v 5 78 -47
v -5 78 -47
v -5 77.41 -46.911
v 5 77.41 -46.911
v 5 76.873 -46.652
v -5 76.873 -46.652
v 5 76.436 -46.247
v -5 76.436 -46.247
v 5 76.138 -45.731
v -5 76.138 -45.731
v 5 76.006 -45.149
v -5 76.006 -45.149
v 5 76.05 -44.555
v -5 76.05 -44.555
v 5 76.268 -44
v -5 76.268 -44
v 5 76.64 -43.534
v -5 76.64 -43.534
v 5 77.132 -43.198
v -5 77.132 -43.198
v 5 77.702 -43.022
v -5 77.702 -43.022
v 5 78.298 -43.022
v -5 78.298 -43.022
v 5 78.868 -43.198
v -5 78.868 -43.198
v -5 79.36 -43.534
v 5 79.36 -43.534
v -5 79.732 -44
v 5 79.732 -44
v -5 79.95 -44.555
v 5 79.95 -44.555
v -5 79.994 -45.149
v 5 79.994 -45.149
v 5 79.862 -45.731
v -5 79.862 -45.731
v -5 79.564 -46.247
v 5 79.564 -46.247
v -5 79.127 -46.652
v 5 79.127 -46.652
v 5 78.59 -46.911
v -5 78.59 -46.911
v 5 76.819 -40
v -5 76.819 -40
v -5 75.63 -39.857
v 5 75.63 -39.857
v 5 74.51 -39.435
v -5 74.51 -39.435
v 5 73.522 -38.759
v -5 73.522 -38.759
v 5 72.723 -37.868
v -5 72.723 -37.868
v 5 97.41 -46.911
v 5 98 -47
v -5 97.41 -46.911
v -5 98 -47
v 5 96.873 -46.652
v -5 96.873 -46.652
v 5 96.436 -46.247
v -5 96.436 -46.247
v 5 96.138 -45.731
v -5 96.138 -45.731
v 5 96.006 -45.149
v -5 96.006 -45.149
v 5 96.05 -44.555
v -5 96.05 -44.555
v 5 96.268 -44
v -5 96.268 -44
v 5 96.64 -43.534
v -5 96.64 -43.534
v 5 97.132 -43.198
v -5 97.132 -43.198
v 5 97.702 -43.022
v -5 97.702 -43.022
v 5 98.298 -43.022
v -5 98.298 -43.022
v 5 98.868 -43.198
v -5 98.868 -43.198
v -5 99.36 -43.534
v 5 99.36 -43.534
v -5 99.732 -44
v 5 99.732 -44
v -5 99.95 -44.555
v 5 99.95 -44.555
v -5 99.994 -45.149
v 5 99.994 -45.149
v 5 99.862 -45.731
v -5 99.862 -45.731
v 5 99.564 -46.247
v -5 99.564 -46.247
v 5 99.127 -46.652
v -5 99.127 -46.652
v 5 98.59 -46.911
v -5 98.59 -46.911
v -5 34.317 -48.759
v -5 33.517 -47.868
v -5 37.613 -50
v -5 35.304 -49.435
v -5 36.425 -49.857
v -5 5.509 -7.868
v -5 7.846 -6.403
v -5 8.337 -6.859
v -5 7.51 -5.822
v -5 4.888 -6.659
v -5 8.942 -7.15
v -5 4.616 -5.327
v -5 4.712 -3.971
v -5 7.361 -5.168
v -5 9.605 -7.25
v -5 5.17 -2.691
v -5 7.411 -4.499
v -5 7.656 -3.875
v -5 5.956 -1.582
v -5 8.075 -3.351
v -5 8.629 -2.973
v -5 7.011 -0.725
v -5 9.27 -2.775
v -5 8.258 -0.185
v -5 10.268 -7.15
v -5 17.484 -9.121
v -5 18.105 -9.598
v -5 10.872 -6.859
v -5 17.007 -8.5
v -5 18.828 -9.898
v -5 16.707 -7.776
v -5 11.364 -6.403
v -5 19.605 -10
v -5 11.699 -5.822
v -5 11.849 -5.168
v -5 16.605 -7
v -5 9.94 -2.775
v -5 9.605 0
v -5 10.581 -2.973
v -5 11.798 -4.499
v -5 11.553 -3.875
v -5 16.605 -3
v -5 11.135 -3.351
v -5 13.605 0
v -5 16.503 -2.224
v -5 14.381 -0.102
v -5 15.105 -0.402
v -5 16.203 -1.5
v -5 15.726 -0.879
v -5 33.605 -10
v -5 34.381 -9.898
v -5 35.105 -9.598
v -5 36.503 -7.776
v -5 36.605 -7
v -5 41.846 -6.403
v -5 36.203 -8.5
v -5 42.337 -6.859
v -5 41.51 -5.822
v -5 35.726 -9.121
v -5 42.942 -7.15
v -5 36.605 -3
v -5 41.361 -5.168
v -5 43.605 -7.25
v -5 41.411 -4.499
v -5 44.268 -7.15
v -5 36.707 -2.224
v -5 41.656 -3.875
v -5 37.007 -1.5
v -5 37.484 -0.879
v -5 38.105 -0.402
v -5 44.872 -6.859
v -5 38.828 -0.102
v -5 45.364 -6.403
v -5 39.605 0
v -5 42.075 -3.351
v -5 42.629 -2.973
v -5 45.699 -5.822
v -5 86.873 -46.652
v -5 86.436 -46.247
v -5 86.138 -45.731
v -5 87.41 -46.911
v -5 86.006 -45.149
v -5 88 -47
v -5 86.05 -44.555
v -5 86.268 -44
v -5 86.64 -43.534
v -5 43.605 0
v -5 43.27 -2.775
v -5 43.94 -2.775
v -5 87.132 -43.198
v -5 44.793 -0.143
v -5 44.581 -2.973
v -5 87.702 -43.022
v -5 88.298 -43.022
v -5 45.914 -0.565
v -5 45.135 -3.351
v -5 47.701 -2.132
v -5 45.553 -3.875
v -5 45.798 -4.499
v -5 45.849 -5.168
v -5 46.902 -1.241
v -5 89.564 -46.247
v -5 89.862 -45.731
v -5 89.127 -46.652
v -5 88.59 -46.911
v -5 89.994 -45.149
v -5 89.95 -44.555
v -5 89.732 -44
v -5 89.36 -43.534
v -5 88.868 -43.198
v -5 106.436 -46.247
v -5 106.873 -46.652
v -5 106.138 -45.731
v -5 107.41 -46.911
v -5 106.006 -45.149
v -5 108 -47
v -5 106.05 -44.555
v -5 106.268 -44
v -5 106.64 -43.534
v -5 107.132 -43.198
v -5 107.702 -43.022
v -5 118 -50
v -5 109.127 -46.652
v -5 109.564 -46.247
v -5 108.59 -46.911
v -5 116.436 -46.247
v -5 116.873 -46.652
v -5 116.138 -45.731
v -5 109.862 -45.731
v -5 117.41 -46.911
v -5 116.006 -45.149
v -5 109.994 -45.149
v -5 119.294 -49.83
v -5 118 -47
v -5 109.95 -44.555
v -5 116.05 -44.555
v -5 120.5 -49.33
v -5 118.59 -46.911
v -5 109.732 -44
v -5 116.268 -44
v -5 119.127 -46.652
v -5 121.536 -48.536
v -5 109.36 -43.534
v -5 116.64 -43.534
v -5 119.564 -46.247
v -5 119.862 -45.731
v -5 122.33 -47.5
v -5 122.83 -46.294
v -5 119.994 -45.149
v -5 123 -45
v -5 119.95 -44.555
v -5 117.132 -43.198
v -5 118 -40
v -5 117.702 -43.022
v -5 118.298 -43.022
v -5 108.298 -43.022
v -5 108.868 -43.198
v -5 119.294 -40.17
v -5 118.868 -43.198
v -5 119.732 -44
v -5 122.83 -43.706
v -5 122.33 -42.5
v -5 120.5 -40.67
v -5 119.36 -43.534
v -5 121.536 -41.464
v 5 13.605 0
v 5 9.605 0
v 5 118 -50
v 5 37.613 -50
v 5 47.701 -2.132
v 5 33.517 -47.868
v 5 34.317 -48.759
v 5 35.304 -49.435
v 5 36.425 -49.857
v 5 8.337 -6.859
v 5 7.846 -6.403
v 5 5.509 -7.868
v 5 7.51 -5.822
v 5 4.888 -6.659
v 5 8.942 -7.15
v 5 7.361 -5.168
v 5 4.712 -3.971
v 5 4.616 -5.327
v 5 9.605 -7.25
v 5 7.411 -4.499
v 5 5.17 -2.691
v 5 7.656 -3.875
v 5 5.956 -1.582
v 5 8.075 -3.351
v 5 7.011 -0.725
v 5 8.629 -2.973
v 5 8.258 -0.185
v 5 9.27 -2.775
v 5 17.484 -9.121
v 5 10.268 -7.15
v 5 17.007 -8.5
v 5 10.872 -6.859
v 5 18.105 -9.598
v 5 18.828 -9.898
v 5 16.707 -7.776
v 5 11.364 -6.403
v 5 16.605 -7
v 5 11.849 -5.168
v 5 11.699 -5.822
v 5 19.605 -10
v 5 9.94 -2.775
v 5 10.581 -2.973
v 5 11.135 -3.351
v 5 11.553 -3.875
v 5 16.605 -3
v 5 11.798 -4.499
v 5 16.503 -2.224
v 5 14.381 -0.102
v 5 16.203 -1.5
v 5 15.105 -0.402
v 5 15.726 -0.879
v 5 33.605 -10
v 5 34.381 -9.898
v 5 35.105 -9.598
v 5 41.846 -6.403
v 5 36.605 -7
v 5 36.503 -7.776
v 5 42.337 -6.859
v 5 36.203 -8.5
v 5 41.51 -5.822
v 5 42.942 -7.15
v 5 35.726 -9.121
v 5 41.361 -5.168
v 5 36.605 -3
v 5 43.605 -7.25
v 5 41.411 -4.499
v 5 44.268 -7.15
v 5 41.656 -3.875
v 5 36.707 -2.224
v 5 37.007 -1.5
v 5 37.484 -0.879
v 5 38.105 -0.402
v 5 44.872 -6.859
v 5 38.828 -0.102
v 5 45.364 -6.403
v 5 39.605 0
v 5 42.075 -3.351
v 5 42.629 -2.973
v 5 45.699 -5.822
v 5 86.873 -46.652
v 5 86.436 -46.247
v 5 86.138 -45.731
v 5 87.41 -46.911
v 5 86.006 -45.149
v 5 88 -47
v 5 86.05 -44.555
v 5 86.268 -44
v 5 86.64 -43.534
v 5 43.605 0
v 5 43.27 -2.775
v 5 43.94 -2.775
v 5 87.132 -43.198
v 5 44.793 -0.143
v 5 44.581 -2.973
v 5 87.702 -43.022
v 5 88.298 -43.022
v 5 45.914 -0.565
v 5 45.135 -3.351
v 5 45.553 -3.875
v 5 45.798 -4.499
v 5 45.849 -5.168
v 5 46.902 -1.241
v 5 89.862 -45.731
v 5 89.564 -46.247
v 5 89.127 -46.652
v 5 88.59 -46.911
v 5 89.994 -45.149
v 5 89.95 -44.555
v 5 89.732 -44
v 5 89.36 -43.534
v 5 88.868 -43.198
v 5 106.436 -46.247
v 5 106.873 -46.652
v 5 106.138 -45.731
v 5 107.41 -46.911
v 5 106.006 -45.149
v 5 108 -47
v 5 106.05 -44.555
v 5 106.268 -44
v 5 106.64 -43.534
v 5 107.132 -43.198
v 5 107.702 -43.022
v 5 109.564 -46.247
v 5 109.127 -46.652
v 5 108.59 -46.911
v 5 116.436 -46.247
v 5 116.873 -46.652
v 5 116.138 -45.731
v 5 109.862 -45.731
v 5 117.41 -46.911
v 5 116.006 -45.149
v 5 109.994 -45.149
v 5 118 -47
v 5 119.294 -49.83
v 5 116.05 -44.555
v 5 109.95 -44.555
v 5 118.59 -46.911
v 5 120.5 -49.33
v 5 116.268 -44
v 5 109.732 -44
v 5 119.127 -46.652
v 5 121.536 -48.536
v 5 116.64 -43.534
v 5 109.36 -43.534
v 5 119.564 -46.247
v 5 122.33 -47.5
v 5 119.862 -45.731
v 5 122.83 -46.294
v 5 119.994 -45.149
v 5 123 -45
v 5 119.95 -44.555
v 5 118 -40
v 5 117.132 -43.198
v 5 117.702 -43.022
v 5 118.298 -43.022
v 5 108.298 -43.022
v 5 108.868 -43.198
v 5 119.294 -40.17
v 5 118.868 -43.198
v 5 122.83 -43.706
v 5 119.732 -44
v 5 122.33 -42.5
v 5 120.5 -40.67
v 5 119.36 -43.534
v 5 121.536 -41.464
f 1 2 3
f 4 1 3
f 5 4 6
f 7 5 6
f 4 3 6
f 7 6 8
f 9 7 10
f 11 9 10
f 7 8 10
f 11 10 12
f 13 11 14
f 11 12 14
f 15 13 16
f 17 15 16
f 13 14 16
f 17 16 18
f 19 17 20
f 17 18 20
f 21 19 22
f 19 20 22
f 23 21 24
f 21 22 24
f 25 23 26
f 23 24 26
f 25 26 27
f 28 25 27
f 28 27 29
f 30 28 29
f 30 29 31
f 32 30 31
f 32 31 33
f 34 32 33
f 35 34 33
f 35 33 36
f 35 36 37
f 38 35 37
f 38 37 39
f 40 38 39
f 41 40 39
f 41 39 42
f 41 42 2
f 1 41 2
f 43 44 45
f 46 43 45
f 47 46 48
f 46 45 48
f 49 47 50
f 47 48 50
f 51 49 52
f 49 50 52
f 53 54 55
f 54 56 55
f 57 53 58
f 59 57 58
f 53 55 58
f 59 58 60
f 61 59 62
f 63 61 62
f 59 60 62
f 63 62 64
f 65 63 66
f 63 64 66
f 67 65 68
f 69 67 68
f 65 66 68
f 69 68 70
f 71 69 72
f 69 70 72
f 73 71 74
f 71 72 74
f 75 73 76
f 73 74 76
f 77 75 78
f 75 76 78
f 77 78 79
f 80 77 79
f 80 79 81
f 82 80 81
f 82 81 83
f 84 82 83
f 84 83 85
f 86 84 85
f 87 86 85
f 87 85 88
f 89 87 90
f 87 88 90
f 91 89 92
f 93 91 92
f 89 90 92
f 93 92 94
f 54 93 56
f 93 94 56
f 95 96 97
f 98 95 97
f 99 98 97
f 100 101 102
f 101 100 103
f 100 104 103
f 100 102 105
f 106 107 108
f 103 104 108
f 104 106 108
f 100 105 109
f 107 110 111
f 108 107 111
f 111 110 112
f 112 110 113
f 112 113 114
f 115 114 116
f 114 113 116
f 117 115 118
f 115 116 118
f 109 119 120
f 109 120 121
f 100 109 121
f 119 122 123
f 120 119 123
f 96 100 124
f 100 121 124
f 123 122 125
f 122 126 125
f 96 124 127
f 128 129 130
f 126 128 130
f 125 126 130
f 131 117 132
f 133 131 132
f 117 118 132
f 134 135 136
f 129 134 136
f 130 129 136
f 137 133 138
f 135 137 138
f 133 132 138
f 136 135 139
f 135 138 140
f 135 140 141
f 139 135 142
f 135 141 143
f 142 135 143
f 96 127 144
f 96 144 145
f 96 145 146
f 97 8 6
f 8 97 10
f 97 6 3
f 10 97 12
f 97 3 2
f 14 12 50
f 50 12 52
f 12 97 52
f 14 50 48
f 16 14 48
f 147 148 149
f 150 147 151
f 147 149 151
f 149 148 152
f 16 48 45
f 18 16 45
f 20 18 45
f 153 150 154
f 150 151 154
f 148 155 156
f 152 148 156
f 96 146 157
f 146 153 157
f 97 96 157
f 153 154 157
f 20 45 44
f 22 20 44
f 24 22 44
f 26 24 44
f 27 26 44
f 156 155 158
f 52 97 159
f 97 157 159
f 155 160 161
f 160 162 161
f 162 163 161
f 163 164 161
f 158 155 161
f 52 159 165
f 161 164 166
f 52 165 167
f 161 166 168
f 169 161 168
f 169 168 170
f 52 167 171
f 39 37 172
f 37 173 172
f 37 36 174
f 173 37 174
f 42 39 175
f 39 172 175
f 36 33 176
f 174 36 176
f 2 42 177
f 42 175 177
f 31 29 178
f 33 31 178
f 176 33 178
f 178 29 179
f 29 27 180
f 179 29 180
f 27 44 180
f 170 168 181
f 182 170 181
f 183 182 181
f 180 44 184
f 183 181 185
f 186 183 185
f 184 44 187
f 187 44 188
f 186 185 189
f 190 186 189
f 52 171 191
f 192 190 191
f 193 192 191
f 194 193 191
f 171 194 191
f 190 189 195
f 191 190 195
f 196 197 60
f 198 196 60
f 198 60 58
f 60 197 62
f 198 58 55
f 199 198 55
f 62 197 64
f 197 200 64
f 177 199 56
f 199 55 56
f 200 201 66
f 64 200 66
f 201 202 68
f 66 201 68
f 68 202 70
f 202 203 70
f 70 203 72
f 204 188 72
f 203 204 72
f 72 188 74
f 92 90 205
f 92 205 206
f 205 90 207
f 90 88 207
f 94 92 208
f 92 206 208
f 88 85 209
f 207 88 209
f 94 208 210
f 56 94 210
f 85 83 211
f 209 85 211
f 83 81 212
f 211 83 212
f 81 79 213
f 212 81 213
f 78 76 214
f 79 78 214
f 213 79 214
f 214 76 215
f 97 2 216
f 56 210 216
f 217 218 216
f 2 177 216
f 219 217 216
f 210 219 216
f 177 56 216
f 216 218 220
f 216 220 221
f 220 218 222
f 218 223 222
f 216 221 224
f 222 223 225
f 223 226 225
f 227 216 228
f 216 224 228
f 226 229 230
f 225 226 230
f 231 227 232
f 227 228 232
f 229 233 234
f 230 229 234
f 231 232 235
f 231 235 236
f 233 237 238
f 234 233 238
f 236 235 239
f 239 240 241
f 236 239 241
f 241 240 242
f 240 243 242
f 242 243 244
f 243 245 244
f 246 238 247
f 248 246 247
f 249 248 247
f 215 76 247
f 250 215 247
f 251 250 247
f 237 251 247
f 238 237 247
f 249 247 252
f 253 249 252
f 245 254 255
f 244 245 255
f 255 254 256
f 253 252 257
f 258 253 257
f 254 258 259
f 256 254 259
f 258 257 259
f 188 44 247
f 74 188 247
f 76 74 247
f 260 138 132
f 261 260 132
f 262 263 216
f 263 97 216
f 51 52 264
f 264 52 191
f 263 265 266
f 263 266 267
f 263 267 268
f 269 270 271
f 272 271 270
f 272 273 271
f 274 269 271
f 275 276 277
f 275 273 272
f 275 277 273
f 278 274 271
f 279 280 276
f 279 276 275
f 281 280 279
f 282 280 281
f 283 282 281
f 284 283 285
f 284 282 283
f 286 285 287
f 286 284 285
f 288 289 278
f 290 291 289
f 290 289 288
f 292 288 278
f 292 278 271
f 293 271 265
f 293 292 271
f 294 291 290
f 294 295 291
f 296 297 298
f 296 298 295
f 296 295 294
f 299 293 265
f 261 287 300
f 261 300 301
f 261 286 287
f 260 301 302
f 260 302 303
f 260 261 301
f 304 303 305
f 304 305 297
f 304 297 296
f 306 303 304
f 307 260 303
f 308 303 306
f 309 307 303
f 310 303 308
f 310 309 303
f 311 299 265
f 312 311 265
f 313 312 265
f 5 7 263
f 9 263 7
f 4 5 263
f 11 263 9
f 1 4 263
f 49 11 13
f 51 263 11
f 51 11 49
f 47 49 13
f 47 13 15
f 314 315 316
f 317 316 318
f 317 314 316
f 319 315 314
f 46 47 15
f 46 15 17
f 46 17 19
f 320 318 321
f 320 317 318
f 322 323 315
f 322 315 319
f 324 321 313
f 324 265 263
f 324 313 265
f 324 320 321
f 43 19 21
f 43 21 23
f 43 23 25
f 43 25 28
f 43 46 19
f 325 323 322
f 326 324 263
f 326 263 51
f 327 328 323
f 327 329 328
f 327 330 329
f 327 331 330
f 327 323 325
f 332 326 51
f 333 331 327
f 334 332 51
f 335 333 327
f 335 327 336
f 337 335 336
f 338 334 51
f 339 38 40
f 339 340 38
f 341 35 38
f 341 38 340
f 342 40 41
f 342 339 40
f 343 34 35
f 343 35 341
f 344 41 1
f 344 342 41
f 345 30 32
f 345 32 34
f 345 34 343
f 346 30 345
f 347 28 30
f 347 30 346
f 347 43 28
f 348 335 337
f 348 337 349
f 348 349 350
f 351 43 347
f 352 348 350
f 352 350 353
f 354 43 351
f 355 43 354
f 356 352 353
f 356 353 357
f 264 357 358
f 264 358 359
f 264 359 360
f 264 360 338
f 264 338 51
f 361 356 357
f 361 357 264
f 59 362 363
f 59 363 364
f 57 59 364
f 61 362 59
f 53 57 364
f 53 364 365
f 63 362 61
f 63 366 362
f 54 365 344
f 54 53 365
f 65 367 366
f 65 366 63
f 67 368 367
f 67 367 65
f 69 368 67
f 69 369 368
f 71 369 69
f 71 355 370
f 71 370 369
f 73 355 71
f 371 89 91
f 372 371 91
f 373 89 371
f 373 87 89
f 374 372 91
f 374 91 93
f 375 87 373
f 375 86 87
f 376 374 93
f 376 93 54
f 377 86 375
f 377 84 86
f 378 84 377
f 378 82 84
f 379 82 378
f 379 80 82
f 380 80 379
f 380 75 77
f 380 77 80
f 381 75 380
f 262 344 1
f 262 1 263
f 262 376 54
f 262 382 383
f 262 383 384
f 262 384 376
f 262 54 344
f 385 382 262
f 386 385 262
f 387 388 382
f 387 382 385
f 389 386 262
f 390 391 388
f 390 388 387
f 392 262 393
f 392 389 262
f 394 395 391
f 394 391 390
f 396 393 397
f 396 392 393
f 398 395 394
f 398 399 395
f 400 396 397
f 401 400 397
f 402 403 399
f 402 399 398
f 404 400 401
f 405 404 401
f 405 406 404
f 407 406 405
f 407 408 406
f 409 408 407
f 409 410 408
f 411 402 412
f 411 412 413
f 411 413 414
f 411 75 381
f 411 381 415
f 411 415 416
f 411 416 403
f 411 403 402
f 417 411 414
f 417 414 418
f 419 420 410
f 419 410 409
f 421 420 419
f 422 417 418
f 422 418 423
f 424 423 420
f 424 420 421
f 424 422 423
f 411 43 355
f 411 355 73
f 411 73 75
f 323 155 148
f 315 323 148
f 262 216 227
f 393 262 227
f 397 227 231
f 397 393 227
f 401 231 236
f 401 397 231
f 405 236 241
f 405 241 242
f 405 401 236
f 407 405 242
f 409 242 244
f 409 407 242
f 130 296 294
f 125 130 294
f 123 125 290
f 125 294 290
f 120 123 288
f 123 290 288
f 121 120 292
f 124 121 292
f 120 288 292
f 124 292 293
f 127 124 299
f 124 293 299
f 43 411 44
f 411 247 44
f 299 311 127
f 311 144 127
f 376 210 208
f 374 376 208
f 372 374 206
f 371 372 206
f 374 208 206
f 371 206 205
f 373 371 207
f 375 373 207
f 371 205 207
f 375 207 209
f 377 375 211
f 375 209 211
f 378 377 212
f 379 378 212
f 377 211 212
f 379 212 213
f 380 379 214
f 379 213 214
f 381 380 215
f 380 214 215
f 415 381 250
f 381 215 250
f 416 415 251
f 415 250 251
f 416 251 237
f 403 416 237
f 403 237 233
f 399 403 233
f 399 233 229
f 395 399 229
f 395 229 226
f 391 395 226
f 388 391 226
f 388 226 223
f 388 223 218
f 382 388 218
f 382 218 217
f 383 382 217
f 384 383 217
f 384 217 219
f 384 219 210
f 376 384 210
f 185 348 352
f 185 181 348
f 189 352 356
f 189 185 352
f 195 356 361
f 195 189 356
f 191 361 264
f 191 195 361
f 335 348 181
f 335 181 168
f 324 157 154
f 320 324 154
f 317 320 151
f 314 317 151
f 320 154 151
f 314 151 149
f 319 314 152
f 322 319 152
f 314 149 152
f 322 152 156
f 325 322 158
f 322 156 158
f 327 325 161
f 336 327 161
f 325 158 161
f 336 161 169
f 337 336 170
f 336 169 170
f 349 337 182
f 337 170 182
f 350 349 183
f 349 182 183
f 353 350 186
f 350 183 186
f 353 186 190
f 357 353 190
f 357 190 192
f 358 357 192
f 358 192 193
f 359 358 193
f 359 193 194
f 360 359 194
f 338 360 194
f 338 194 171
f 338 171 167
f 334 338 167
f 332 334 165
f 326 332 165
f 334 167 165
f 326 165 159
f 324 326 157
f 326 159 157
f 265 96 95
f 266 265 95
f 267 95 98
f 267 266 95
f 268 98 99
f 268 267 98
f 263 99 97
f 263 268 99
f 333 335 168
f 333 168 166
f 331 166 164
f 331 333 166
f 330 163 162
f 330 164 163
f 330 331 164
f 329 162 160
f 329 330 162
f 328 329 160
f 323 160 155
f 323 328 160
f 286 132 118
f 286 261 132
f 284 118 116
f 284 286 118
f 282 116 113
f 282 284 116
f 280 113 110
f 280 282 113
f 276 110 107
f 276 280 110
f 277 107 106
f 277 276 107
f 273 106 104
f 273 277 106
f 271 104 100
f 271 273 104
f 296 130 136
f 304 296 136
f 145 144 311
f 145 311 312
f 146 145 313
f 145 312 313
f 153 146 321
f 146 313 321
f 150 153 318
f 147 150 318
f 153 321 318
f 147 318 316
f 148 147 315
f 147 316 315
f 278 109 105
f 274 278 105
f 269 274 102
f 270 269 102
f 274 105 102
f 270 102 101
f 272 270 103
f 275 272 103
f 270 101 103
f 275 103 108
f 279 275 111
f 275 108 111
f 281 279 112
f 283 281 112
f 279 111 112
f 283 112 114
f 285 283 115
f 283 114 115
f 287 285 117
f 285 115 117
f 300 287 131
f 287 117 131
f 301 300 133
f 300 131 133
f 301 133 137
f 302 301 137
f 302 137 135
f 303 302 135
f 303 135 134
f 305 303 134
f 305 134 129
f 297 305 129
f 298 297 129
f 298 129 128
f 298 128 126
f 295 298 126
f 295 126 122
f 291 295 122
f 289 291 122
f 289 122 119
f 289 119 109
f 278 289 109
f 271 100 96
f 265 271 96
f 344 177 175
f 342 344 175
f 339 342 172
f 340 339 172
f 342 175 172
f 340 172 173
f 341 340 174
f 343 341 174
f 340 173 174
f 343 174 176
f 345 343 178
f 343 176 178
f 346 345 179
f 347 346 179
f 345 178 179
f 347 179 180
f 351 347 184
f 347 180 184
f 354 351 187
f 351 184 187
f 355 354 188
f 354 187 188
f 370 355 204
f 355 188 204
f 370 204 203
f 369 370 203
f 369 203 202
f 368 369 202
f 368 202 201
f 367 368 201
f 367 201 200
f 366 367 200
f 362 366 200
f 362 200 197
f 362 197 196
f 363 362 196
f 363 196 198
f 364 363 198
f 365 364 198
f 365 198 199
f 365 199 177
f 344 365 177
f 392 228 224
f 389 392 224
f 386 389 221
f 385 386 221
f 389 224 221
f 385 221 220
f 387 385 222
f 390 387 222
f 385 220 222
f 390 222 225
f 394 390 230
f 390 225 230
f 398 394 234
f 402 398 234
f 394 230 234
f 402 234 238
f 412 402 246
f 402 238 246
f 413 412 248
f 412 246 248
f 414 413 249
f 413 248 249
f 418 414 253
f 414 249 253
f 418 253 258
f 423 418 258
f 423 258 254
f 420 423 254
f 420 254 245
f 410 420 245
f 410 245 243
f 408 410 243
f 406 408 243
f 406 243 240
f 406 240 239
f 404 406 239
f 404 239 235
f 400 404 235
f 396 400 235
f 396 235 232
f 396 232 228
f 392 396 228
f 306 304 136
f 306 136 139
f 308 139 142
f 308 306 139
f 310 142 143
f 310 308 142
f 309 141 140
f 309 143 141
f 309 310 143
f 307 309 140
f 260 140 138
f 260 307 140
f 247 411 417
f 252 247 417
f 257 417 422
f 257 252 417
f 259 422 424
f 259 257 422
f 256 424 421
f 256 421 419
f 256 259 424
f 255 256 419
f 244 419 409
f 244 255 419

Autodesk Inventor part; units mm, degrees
ref_plane "YZ Plane" through (0, 0, 0) normal (1, 0, 0) x (0, 1, 0)
ref_plane "XZ Plane" through (0, 0, 0) normal (0, 1, 0) x (-1, 0, 0)
ref_plane "XY Plane" through (0, 0, 0) normal (0, 0, 1) x (1, 0, 0)
sketch "スケッチ1" plane through (0, 0, 0) normal (1, 0, 0) x (0, 1, 0)
  line L0 (0, 0) -> (35.0104, -50)
  line L1 (35.0104, -50) -> (123, -50)
  line L2 (123, -50) -> (123, -40)
  line L3 (123, -40) -> (74.216, -40)
  line L4 (74.216, -40) -> (46.2077, 0)
  line L5 (46.2077, 0) -> (0, 0)
  line L6 (0, 10) -> (0, -60) projected
  point P0 (9.6049, -5)
  point P1 (43.6049, -5)
  dimension "d1" = 35
  dimension "d2" = 10
  dimension "d3" = 123
  dimension "d4" = 50
  dimension "d19" = 5
  dimension "d20" = 5
  dimension "d21" = 5
  dimension "d22" = 5
  dimension "d23" = 34
extrude "押し出し1" add sketch "スケッチ1" along normal mid plane 10
sketch "スケッチ2" plane through (5, 0, 0) normal (1, 0, 0) x (0, 0, -1)
  line L0 (0, 46.2077) -> (0, 0) projected
  line L1 (0, 0) -> (50, 35.0104) projected
  point P0 (5, 43.6049)
  point P1 (5, 9.6049)
  dimension "d9" = 5
  dimension "d10" = 5
  dimension "d11" = 34
hole "穴1" at (5, 43.6049, -5) at (5, 9.6049, -5) direction (-1, 0, 0) diameter 4.5 end through all clearance for "Flat Head Machine Screw" size "M4" standard "Ansi Metric M Profile"
fillet "フィレット1" radius 5 4 edges at (0, 74.216, -40) (0, 46.2077, 0) (0, 0, 0) (0, 35.0104, -50)
fillet "フィレット2" radius 5 2 edges at (0, 123, -40) (0, 123, -50)
sketch "スケッチ3" plane through (5, 0, 0) normal (1, 0, 0) x (0, 0, -1)
  arc A0 (50, 118) -> (40, 118) centre (45, 118) ccw projected
  point P0 (0, 0)
hole "穴2" at (5, 118, -45) direction (-1, 0, 0) diameter 4 end through all
pattern_linear "矩形状パターン1" count 5 spacing 10 along (0, -1, 0) of "穴2"
sketch "スケッチ4" plane through (-5, 0, 0) normal (-1, 0, 0) x (0, 0, 1)
  line L0 (0, 36.6049) -> (-10, 36.6049)
  line L1 (-10, 36.6049) -> (-10, 16.6049)
  line L2 (-10, 16.6049) -> (0, 16.6049)
  line L3 (0, 16.6049) -> (0, 36.6049)
  line L4 (0, 9.6049) -> (0, 43.6049) projected
  circle A0 centre (-5, 43.6049) radius 2.25 projected
  circle A1 centre (-5, 9.6049) radius 2.25 projected
  point P0 (0, 0)
  dimension "d38" = 10
  dimension "d39" = 7
  dimension "d40" = 7
extrude "押し出し2" cut sketch "スケッチ4" against normal through all contours L3 L2 L1 L0
fillet "フィレット3" radius 3 4 edges at (0, 36.6049, 0) (0, 36.6049, -10) (0, 16.6049, -10) (0, 16.6049, 0)
properties part number "shooter_base8[" material "ABS プラスチック"
